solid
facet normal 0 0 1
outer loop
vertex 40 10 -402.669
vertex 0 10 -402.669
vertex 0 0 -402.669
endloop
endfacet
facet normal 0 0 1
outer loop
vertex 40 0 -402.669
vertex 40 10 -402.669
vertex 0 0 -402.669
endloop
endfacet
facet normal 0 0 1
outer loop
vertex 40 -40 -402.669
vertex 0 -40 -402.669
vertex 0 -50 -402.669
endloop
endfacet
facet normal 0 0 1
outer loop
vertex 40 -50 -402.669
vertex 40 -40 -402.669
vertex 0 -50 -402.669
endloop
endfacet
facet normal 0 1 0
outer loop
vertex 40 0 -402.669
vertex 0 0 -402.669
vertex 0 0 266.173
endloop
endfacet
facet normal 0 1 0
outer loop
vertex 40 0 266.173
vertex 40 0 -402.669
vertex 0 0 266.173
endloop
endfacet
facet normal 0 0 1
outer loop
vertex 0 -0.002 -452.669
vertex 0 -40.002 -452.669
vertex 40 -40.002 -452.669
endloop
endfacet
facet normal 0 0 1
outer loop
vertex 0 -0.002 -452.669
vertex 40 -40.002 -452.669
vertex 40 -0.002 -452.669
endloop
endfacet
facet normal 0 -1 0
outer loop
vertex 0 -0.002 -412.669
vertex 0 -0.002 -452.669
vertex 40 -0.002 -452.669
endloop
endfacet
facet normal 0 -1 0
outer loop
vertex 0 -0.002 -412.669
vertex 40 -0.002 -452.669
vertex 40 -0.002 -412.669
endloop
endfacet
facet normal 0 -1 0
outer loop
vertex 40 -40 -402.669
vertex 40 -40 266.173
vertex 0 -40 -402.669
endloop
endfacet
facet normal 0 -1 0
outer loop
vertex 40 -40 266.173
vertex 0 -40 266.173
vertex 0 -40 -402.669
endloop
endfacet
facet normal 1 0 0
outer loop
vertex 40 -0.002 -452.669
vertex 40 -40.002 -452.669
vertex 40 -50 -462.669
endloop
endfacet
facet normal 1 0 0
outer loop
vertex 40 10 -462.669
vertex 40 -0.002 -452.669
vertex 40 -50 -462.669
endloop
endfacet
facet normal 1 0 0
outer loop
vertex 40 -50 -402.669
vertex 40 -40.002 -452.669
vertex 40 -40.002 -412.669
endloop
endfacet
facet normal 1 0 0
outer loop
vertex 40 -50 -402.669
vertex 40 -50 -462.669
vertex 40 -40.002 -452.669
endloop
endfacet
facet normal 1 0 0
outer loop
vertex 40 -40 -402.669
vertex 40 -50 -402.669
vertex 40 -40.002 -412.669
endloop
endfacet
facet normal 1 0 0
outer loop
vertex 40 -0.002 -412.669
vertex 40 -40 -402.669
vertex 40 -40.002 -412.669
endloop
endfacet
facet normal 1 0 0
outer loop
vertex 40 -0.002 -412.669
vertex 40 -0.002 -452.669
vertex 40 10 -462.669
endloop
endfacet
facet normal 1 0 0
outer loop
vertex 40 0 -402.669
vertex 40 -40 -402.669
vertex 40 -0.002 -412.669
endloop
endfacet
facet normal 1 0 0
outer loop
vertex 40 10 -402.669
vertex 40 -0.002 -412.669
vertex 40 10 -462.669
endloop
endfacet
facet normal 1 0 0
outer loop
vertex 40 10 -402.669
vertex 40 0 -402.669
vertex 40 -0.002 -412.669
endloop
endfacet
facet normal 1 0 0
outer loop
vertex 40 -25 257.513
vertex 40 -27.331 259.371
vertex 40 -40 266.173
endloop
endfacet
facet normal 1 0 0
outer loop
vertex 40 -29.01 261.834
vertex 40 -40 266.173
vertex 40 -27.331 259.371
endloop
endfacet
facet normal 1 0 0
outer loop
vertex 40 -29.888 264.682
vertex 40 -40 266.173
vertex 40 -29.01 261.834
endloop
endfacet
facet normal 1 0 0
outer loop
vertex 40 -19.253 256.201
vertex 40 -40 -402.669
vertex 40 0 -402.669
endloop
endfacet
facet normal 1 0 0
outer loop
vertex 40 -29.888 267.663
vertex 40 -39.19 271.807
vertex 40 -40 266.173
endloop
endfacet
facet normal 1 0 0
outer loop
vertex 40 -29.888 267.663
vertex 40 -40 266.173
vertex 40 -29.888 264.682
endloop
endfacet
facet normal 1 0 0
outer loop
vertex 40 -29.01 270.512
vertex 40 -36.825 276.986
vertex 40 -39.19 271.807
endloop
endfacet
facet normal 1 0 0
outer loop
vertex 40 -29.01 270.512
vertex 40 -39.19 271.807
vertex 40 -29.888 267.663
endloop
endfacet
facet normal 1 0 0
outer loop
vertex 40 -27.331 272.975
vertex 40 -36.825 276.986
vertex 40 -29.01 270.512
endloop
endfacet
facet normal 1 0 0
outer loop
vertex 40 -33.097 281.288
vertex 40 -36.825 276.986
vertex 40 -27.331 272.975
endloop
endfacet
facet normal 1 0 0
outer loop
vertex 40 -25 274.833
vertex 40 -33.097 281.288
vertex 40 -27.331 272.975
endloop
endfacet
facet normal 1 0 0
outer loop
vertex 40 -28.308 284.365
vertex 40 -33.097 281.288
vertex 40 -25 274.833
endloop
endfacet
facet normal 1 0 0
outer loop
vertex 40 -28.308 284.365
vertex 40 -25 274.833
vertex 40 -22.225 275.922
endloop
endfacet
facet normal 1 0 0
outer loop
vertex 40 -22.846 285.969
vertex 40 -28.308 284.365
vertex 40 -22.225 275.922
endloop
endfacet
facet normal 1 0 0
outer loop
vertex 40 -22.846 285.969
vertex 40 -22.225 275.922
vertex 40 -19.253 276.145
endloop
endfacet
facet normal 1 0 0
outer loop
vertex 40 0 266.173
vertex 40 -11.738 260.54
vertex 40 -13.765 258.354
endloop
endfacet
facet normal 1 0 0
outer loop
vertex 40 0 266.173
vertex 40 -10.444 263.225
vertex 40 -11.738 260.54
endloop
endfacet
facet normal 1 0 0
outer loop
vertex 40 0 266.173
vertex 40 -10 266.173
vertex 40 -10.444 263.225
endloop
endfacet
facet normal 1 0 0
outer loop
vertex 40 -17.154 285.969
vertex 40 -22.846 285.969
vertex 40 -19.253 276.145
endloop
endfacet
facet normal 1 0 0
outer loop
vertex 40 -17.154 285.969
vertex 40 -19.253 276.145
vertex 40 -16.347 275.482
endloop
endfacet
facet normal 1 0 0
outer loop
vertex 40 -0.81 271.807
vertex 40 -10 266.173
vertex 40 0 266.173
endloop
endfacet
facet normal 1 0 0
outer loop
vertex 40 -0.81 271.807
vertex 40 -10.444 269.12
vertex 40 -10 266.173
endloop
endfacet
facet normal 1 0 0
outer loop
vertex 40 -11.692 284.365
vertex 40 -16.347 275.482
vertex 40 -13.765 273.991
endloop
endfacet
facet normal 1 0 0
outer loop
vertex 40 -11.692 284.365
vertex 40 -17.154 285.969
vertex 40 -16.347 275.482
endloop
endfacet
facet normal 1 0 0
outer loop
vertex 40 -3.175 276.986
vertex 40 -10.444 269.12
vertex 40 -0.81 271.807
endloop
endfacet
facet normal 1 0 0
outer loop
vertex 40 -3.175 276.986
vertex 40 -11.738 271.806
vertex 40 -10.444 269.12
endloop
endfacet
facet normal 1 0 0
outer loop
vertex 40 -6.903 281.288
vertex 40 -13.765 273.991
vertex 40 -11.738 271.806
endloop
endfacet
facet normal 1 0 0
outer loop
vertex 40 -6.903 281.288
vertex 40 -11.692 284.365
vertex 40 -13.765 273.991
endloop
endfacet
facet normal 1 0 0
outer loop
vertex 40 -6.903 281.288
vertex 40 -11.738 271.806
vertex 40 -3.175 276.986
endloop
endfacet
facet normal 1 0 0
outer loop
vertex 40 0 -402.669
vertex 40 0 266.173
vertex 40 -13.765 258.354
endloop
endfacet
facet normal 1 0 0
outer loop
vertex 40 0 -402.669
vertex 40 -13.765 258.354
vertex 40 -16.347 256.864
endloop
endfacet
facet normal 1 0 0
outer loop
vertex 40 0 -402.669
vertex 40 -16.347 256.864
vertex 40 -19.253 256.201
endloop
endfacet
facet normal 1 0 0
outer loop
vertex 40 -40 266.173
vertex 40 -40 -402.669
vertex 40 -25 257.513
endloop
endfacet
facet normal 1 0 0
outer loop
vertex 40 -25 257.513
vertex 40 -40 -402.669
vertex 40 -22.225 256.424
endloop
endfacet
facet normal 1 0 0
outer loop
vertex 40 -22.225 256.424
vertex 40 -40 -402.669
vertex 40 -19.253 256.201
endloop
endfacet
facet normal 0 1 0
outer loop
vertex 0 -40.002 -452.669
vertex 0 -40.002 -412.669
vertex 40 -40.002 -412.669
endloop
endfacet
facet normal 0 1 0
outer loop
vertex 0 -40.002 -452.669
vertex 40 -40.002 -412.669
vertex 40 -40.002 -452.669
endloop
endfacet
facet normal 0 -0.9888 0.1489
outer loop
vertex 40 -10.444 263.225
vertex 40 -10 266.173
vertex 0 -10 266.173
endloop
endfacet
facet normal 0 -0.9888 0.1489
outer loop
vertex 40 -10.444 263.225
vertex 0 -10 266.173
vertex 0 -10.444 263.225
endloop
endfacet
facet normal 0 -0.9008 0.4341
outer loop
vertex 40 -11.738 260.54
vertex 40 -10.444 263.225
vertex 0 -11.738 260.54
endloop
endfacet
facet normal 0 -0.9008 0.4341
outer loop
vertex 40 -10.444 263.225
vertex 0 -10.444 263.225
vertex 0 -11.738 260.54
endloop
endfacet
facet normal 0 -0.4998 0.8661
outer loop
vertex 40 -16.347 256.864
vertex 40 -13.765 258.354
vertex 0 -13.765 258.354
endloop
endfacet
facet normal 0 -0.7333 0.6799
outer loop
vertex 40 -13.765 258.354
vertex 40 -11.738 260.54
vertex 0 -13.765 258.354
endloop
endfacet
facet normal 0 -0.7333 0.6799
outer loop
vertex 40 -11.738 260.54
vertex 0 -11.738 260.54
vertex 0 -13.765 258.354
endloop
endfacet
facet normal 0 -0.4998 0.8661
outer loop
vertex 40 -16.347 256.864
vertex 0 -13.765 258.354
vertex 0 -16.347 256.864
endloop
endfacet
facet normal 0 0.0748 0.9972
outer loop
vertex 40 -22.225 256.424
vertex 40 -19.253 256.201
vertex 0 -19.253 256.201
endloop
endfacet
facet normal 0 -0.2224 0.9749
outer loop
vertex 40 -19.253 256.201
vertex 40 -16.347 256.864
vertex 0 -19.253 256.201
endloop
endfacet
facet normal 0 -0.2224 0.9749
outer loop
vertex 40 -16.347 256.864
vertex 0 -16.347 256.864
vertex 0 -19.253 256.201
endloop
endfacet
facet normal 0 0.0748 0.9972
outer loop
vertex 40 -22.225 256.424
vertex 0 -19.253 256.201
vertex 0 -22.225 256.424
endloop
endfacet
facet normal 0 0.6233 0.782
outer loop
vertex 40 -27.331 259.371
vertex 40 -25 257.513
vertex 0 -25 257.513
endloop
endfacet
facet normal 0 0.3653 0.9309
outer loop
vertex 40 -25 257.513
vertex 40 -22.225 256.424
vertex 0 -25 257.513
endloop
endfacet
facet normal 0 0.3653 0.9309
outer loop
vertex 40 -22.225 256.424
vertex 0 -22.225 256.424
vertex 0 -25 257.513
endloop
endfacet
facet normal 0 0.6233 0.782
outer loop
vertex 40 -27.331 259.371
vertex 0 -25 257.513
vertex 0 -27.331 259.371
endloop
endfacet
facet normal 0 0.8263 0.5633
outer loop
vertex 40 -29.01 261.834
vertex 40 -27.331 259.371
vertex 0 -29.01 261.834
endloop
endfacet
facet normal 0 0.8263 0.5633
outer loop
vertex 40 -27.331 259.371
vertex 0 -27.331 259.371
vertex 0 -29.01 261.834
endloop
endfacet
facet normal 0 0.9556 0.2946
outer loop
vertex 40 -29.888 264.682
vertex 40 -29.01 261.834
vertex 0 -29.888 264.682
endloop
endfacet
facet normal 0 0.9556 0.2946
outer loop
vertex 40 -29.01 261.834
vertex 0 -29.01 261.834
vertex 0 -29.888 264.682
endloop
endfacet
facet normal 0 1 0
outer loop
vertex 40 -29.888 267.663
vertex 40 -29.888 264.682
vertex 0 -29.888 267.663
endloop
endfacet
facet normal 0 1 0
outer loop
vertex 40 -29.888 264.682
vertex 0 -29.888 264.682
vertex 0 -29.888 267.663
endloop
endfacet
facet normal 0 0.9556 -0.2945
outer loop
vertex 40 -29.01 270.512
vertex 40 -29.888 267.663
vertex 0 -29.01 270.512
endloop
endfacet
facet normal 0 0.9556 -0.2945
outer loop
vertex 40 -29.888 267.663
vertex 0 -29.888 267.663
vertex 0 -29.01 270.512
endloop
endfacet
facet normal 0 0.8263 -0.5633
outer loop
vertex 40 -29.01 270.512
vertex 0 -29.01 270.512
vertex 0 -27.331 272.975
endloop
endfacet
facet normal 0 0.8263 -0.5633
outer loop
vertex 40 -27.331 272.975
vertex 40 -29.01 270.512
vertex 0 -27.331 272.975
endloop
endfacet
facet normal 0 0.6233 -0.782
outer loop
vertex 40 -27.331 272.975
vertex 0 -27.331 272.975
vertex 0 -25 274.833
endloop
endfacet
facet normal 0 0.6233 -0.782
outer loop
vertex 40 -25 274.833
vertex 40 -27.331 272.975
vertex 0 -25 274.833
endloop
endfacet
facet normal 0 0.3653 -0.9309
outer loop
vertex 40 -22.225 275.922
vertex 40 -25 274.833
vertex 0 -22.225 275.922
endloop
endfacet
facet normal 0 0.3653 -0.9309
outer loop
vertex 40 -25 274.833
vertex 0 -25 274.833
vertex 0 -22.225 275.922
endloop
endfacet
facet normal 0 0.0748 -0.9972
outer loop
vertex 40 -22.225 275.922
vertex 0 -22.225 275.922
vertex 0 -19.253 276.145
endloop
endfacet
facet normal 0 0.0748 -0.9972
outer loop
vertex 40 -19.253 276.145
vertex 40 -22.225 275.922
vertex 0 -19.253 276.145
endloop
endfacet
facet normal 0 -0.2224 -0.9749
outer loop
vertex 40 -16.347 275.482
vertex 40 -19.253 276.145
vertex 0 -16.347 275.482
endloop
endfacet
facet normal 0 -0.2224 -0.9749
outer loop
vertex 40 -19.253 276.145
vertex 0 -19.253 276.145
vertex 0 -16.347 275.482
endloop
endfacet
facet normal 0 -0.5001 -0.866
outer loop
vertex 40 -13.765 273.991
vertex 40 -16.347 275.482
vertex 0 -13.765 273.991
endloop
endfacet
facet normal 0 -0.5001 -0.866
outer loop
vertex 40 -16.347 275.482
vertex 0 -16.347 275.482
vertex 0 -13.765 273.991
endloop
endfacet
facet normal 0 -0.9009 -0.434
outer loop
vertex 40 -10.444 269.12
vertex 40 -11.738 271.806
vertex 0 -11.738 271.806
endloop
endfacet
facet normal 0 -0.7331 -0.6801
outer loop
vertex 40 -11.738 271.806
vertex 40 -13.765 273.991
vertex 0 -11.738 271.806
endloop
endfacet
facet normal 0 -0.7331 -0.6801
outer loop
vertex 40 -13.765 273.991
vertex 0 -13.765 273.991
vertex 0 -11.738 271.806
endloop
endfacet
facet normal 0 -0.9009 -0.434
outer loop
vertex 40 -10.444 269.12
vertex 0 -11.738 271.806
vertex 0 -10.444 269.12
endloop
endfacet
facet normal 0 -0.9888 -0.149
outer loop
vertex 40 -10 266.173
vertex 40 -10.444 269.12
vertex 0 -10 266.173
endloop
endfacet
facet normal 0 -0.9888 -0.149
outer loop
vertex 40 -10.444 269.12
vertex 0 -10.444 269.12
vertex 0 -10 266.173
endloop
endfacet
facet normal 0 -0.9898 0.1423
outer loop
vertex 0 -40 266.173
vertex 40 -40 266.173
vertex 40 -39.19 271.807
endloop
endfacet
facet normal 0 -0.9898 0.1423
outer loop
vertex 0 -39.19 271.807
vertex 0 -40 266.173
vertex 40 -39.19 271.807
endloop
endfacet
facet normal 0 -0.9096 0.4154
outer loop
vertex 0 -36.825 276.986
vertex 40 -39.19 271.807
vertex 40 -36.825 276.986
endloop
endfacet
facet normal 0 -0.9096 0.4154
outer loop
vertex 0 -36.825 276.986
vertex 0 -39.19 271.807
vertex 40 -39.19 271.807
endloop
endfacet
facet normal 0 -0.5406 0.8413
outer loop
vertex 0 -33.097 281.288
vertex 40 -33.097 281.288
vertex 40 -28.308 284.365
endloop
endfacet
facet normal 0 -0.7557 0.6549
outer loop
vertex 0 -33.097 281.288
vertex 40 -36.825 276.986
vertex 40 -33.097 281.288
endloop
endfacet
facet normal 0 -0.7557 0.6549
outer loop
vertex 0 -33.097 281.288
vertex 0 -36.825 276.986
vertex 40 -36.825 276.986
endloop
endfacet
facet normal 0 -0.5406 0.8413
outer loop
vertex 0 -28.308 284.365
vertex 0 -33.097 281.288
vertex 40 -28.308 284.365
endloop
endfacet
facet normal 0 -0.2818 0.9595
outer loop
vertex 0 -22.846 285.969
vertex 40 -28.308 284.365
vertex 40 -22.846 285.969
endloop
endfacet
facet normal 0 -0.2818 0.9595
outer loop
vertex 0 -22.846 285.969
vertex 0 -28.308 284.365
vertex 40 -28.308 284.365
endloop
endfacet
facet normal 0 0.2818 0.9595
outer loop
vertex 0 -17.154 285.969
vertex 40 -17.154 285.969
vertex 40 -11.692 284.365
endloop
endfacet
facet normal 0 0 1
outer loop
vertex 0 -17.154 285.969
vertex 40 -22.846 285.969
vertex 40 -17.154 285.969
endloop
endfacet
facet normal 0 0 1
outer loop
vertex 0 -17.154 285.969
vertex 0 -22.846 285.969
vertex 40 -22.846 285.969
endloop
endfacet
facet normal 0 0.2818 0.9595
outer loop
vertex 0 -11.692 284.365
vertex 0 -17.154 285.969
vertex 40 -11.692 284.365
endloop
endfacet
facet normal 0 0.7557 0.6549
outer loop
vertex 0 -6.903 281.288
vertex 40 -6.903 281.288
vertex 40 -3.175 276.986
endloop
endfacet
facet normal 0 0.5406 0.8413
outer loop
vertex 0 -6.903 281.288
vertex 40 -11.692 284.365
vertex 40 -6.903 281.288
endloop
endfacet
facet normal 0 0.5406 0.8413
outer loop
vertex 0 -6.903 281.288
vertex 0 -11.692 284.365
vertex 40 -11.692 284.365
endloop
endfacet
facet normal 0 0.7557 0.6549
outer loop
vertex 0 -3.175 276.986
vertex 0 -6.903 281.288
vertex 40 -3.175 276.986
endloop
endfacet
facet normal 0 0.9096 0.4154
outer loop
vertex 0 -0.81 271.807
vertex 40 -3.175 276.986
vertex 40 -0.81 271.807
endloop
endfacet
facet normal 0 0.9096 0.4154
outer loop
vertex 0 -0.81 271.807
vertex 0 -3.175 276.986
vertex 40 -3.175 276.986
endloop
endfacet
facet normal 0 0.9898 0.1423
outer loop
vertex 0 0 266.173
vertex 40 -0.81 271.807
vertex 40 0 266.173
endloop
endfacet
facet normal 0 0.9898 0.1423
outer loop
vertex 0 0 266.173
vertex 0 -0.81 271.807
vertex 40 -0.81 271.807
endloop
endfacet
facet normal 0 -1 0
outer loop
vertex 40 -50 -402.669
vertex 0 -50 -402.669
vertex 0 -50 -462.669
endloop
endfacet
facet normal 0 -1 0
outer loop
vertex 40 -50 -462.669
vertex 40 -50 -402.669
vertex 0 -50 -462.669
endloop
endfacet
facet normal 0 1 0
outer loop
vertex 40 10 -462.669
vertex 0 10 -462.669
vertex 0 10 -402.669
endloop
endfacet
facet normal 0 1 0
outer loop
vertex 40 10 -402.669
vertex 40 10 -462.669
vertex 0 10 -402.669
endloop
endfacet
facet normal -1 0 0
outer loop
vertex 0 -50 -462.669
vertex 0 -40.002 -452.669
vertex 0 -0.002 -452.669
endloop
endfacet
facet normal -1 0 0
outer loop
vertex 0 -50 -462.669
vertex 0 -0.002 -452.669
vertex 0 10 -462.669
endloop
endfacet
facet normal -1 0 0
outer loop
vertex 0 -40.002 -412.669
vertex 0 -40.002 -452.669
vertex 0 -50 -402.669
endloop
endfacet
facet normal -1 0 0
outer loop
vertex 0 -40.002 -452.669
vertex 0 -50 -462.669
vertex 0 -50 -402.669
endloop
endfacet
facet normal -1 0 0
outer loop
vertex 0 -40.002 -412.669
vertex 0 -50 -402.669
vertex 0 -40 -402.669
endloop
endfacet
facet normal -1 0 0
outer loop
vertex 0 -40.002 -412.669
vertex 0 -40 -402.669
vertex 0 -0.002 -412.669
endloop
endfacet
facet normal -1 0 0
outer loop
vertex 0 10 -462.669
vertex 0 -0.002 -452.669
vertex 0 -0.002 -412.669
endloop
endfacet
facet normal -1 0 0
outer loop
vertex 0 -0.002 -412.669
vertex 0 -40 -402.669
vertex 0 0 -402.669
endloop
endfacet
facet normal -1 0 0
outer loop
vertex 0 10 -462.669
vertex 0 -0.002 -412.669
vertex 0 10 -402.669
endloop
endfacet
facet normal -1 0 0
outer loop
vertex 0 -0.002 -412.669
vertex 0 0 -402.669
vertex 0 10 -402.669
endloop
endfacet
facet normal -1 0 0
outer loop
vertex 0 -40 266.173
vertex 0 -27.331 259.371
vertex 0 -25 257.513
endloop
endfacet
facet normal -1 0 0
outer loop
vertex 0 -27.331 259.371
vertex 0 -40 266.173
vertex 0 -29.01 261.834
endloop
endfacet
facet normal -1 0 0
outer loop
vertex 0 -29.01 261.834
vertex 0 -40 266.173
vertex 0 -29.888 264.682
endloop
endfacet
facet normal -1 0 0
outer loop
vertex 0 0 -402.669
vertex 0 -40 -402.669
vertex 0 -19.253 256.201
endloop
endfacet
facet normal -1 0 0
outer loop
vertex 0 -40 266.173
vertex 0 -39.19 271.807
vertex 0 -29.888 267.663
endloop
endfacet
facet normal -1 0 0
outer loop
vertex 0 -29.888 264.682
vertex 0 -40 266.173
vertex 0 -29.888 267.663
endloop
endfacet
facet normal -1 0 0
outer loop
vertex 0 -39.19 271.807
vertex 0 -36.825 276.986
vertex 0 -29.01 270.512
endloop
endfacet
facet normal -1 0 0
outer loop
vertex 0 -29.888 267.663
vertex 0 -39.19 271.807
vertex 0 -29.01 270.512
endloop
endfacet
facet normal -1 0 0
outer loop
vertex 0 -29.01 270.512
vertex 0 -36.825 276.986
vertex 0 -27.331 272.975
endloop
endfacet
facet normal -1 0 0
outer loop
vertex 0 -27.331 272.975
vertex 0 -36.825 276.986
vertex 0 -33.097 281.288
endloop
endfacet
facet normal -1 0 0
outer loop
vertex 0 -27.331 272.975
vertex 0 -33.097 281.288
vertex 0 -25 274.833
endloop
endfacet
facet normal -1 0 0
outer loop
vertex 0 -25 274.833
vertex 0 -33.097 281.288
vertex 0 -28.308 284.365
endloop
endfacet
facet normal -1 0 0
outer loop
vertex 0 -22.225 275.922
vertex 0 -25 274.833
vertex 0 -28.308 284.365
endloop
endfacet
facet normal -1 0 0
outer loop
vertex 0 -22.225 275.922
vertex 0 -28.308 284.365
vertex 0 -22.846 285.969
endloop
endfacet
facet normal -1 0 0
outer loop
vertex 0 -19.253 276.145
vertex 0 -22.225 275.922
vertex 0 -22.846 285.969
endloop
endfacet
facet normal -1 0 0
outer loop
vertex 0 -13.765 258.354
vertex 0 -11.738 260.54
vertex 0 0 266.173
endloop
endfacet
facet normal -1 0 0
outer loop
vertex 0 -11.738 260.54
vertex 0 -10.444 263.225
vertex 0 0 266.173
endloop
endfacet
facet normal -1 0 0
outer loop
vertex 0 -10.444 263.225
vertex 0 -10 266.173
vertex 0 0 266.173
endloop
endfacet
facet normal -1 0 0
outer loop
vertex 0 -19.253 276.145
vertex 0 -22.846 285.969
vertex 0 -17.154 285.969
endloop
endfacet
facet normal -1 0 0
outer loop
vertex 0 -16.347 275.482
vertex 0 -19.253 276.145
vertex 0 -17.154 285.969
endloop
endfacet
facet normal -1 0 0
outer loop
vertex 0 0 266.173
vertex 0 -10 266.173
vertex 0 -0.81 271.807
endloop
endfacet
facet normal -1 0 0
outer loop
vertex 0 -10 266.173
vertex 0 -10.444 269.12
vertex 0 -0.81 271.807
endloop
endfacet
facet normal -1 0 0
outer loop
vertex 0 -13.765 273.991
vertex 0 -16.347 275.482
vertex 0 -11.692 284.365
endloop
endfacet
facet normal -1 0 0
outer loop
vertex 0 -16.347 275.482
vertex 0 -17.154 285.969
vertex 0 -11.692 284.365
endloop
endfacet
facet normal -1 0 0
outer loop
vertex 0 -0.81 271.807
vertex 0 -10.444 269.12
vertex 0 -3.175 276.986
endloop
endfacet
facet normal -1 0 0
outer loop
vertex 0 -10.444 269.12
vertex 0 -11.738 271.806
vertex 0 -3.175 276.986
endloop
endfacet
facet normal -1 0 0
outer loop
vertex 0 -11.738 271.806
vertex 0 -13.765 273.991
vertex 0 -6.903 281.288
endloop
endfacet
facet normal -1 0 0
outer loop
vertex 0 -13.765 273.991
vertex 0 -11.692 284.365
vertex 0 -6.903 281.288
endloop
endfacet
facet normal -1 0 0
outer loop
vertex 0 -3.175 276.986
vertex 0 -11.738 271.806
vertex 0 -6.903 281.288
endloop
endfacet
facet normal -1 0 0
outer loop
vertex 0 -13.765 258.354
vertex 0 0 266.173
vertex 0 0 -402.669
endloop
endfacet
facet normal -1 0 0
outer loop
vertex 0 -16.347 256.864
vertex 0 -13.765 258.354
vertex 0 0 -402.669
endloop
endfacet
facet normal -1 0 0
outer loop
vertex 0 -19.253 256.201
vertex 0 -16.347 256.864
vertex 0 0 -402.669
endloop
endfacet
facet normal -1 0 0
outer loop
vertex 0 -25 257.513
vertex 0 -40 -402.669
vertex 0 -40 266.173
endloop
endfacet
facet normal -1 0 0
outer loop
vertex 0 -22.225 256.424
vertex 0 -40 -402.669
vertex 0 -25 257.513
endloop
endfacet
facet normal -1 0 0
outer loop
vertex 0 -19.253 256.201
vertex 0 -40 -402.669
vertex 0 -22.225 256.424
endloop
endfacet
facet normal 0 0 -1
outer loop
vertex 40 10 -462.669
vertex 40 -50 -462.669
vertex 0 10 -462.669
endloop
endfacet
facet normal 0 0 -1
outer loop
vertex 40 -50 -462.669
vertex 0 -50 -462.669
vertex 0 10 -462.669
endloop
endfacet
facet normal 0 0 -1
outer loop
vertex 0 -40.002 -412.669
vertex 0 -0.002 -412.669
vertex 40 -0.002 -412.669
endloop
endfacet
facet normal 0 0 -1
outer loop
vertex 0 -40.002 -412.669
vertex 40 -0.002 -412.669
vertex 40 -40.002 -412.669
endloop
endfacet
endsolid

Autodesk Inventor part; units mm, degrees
ref_plane "YZ Plane" through (0, 0, 0) normal (1, 0, 0) x (0, 1, 0)
ref_plane "XZ Plane" through (0, 0, 0) normal (0, 1, 0) x (-1, 0, 0)
ref_plane "XY Plane" through (0, 0, 0) normal (0, 0, 1) x (1, 0, 0)
sketch "Sketch1" plane through (0, 0, 0) normal (1, 0, 0) x (0, 1, 0)
  arc A0 (0, 266.1728) -> (-40, 266.1728) centre (-20, 266.1728) ccw
  circle A1 centre (-20, 266.1728) radius 10
  line L0 (0, 266.1728) -> (-10, 266.1728)
  line L1 (-0.0023, -412.6691) -> (-40.0023, -412.6691)
  line L2 (-40.0023, -412.6691) -> (-40.0023, -452.6691)
  line L3 (-40.0023, -452.6691) -> (-0.0023, -452.6691)
  line L4 (-0.0023, -452.6691) -> (-0.0023, -412.6691)
  line L5 (-50, -462.6691) -> (10, -462.6691)
  line L6 (10, -462.6691) -> (10, -402.6691)
  line L7 (10, -402.6691) -> (-50, -402.6691)
  line L8 (-50, -402.6691) -> (-50, -462.6691)
  line L9 (-40, 266.1728) -> (-40, -402.6691)
  line L10 (0, -402.6691) -> (0, 266.1728)
  point P0 (0, 0)
  dimension "d5" = 20
  dimension "d4" = 40
  dimension "d6" = 40
  dimension "d7" = 40
  dimension "d8" = 60
  dimension "d9" = 60
  dimension "d11" = 10
  dimension "d13" = 20
extrude "Extrusion1" add sketch "Sketch1" along normal blind 40
properties part number "long extention"
